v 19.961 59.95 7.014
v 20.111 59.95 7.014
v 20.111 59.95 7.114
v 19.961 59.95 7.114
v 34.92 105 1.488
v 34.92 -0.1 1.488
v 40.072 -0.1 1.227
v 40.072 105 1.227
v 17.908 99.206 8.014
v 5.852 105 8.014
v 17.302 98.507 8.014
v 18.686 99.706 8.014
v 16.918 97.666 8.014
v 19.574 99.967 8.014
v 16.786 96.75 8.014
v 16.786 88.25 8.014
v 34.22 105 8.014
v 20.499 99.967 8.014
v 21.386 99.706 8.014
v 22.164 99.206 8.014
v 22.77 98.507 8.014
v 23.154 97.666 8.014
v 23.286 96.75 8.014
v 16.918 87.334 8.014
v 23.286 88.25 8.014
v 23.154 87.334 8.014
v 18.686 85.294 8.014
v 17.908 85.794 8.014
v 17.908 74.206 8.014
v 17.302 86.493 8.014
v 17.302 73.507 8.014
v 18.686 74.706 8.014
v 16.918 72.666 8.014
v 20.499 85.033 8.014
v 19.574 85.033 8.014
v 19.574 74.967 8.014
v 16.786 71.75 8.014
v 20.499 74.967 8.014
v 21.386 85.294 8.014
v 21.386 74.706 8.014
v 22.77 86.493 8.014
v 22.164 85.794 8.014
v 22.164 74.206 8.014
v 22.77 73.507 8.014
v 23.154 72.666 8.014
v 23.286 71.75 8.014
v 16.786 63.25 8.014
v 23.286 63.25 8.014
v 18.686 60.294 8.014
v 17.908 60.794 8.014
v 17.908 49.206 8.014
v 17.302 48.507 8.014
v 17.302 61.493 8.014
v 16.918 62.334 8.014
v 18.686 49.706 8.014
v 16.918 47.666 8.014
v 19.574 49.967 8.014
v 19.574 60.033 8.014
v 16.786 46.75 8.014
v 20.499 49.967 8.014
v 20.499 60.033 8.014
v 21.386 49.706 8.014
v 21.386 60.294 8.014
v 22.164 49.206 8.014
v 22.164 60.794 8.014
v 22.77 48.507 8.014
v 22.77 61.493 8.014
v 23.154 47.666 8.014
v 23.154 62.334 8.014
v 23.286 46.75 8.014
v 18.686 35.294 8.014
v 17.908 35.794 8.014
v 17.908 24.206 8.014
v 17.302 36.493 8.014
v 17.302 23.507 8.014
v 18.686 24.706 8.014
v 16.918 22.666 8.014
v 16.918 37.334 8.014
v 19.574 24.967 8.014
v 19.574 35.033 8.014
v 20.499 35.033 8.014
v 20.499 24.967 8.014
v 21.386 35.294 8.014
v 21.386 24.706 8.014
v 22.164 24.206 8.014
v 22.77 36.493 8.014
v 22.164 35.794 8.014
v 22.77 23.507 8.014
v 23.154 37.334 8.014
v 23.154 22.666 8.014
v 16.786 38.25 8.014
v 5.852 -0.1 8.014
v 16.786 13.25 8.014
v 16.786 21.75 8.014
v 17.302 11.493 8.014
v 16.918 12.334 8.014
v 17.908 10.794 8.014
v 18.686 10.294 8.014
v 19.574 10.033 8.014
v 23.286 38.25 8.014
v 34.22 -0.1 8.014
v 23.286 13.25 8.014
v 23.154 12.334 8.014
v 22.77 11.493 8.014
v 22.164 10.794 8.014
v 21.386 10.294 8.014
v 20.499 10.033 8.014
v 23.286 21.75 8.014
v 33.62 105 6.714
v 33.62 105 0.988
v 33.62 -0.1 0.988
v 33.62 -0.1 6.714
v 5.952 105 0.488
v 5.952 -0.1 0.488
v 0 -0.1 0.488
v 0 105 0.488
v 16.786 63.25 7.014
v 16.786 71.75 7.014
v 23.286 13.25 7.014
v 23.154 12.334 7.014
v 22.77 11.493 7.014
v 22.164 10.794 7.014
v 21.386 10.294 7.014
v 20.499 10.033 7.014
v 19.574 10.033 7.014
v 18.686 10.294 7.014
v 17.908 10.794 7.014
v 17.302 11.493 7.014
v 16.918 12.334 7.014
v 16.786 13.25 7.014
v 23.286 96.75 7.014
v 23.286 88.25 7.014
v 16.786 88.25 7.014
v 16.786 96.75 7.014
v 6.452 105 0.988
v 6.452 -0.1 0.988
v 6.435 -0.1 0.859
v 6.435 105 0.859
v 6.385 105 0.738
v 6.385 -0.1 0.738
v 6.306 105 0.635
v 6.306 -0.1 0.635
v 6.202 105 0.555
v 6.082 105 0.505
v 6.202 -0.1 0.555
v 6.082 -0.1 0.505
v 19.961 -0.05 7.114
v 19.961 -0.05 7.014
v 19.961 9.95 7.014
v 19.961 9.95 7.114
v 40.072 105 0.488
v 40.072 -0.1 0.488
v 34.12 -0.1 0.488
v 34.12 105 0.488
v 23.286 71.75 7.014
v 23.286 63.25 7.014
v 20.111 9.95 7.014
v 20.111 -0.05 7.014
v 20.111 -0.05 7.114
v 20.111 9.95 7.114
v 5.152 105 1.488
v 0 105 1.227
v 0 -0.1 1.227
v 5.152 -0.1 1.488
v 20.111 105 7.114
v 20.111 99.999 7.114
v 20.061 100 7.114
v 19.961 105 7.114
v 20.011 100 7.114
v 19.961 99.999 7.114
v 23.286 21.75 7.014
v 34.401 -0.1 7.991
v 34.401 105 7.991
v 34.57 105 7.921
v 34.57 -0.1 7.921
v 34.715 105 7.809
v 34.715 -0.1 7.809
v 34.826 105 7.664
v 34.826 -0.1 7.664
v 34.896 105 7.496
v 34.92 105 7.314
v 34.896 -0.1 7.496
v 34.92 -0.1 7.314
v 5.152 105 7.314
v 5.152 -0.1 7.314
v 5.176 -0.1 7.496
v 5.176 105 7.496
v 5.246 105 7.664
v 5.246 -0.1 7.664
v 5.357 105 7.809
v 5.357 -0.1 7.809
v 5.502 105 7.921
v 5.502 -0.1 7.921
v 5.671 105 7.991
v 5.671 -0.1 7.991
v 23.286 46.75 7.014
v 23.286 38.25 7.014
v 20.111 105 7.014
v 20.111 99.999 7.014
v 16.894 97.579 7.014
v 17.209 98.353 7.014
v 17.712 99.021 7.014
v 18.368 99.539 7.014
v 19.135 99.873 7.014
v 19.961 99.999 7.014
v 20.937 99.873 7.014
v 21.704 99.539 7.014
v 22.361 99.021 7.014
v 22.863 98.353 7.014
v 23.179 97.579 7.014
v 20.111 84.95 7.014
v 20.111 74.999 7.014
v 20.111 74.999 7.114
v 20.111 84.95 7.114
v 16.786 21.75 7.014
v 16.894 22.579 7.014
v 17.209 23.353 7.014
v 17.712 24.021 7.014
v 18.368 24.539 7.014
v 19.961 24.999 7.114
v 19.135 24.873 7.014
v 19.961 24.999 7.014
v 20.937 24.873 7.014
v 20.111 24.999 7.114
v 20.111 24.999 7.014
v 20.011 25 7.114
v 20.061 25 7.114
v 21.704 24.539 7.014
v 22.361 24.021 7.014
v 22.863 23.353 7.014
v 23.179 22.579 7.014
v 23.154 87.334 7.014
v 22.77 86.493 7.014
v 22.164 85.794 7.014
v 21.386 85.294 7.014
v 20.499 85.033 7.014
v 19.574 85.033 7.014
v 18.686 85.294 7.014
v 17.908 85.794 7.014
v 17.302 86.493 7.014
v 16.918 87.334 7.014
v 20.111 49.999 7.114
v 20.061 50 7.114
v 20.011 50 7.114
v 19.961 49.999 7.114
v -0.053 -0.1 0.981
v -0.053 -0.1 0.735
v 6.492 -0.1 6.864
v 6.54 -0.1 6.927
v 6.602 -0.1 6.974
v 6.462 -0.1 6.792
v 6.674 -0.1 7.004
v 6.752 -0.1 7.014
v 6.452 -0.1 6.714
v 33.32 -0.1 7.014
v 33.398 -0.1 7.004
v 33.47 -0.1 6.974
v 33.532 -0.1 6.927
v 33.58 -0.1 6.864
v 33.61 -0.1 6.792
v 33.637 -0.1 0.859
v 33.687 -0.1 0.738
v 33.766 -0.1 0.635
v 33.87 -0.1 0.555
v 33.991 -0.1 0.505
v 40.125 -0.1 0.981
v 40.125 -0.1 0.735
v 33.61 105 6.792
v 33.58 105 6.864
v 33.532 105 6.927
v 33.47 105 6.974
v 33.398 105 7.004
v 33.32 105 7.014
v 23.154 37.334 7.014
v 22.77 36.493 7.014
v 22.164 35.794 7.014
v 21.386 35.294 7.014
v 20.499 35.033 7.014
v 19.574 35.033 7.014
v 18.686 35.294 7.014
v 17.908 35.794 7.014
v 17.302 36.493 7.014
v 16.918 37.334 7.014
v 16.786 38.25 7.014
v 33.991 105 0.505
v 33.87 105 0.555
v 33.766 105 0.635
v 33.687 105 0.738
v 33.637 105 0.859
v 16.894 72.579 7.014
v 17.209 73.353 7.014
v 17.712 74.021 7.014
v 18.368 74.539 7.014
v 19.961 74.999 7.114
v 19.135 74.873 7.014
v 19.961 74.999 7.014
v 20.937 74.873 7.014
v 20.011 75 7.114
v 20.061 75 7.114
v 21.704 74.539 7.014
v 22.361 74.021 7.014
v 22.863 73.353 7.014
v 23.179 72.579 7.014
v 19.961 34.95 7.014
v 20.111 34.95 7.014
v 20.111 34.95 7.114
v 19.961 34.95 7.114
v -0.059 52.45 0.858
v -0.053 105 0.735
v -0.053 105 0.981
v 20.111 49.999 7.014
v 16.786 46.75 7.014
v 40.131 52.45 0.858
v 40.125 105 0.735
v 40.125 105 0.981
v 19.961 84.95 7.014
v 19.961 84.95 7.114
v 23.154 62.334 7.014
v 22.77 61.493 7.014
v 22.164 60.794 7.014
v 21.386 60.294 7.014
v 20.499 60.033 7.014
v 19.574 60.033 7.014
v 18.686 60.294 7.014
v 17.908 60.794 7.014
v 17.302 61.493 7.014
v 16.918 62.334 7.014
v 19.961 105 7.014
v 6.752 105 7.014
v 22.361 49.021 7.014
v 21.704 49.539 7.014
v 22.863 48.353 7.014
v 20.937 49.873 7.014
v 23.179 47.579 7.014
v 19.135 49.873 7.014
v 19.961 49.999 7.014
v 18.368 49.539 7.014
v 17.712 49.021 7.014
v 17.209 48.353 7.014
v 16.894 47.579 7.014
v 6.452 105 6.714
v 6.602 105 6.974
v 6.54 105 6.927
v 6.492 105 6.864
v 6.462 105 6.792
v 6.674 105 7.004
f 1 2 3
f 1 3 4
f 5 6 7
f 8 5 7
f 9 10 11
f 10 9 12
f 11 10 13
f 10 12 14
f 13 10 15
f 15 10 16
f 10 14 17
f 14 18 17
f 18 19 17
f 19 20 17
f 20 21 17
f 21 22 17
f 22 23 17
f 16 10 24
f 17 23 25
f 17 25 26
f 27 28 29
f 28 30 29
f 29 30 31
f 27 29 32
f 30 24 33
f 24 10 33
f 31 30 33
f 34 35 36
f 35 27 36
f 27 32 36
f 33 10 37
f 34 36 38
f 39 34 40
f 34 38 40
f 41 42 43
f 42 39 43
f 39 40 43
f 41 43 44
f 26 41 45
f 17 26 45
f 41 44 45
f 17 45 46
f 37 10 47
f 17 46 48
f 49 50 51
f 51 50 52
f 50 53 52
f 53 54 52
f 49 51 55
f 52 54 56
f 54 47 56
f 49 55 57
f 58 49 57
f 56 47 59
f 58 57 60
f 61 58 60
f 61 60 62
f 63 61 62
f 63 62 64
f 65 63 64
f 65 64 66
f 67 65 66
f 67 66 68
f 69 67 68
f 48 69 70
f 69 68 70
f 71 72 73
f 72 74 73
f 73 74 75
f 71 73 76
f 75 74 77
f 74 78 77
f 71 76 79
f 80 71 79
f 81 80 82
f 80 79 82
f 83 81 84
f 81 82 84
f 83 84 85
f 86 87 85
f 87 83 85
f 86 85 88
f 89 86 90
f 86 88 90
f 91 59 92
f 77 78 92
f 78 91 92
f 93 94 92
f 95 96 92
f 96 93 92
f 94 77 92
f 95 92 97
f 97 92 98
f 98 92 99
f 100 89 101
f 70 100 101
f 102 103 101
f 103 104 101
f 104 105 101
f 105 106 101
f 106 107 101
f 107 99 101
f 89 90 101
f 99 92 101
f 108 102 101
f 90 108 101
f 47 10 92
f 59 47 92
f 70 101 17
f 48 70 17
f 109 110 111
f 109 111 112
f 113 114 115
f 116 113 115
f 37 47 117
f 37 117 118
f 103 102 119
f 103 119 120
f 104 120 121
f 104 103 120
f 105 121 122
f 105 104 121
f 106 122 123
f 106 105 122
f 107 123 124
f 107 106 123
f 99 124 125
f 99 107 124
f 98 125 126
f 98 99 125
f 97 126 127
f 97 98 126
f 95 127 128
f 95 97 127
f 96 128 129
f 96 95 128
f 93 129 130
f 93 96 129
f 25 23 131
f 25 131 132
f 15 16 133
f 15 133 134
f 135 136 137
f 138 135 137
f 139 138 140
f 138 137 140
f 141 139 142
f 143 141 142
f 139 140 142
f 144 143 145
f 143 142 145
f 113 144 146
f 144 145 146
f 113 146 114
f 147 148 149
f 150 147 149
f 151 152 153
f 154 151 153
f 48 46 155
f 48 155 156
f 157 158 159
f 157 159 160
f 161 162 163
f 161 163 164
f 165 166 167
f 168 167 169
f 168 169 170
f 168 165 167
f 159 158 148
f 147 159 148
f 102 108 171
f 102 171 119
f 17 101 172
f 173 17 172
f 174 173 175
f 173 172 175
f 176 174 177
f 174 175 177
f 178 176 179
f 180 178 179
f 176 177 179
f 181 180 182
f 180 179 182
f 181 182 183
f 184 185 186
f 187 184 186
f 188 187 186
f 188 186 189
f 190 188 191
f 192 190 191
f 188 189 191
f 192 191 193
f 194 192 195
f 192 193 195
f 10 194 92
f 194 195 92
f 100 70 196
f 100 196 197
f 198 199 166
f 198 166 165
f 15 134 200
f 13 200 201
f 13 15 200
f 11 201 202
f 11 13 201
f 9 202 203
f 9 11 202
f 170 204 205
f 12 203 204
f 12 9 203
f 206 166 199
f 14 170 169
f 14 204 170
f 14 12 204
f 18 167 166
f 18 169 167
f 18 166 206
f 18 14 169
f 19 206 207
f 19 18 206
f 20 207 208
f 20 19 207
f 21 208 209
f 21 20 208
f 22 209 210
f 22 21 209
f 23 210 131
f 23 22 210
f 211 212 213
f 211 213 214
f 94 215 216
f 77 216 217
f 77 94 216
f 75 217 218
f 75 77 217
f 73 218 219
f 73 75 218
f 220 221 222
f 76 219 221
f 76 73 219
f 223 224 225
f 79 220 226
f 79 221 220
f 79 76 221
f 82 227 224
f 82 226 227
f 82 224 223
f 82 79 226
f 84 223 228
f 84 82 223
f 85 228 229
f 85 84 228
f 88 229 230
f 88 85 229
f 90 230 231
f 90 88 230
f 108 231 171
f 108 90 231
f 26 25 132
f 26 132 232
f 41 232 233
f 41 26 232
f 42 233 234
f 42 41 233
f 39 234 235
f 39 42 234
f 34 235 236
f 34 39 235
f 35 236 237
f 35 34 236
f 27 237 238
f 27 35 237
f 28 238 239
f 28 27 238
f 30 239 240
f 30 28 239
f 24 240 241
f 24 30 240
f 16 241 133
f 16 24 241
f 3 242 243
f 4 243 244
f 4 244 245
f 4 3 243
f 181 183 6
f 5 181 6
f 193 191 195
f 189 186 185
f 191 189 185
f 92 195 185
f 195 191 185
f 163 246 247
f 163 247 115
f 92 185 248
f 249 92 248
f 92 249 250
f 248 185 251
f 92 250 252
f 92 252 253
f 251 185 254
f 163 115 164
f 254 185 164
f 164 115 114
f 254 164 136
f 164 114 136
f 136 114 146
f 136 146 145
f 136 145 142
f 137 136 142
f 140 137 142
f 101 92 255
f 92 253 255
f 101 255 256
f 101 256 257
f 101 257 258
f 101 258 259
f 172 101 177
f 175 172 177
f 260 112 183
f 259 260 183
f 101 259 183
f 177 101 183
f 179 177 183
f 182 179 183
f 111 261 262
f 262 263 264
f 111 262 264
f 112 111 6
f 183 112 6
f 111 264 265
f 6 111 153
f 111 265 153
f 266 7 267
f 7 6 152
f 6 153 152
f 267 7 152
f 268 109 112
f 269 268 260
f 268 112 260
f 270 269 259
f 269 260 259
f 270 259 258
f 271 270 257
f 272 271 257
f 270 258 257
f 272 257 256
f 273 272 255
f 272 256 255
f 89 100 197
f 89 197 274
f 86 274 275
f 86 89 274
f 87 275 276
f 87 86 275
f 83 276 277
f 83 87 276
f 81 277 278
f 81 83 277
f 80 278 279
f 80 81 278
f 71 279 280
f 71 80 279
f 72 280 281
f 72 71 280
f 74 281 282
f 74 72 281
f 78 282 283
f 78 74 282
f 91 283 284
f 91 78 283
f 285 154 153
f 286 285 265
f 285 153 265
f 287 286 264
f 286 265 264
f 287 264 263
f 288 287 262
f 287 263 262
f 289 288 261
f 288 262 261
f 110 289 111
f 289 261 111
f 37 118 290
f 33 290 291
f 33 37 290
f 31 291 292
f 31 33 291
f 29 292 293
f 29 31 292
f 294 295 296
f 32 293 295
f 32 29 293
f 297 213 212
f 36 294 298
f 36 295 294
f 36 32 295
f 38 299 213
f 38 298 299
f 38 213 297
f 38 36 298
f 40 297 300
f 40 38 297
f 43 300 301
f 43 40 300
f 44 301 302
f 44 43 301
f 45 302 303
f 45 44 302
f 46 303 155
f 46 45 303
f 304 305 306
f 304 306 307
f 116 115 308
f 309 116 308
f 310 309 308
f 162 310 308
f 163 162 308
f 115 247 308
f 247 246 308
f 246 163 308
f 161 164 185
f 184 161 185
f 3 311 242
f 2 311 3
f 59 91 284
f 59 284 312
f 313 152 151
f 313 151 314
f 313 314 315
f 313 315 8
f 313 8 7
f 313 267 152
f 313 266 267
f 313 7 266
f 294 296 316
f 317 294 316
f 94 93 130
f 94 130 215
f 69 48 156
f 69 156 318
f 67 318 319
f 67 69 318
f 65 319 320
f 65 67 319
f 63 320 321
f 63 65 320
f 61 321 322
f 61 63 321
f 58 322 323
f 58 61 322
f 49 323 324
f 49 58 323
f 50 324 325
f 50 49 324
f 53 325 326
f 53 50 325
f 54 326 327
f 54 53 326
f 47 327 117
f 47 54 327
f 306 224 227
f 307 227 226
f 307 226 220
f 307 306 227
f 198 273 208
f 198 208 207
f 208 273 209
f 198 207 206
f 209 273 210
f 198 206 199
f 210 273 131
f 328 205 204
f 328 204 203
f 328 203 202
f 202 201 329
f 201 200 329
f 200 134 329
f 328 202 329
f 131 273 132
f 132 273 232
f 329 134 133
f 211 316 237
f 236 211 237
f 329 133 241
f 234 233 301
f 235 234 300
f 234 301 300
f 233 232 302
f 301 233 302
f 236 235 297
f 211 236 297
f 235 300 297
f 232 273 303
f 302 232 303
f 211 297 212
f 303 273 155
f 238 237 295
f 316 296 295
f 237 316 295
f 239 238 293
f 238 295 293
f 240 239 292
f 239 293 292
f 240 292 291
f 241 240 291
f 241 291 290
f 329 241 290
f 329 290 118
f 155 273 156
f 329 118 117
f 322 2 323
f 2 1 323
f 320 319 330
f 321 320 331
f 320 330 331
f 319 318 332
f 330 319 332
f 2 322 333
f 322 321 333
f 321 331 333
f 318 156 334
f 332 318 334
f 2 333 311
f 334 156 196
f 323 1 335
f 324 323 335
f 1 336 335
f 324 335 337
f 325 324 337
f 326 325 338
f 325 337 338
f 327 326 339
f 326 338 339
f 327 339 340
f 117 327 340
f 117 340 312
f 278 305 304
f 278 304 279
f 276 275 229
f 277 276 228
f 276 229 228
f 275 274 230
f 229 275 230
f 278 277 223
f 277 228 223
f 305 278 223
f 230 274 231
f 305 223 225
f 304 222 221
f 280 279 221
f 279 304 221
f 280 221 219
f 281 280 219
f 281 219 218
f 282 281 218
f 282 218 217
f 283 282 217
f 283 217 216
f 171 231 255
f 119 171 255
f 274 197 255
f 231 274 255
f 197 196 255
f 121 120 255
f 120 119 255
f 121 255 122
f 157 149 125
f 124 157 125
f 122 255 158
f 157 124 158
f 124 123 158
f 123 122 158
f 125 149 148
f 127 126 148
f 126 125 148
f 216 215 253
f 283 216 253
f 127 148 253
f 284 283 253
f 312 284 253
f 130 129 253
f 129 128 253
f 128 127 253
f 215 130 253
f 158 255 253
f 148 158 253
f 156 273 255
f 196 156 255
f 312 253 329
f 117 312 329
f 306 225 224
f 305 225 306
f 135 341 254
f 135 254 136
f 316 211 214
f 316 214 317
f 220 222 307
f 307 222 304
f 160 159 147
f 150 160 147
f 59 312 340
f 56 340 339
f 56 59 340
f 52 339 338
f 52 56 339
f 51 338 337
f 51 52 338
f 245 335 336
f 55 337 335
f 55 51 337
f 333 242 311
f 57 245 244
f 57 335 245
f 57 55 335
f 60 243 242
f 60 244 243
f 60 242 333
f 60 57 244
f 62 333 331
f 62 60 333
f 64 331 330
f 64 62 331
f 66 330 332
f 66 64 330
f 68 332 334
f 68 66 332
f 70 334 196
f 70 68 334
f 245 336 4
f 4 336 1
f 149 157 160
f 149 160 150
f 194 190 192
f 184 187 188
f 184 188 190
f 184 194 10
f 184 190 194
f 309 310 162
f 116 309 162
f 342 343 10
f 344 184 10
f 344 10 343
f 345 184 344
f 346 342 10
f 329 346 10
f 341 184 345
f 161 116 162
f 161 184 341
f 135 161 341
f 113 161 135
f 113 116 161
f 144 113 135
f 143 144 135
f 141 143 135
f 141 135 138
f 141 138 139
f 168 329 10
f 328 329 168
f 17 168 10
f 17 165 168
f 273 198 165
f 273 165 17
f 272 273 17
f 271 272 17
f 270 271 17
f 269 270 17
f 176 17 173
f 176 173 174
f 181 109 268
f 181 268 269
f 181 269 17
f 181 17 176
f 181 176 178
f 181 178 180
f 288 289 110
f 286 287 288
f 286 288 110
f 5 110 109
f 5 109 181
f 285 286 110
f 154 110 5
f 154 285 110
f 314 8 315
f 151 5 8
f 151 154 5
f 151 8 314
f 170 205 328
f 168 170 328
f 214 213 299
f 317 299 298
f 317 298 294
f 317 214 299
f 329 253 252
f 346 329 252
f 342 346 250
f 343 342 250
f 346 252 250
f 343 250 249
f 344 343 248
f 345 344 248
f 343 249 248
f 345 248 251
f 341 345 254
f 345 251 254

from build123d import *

# Parameters (mm, degrees)
SALIENTE_EXTRUIR1_DEPTH      = 105
SALIENTE_EXTRUIR1_DEPTH_BACK = 0.1
CORTAR_EXTRUIR4_DEPTH        = 10
CROQUIS4_W                   = 0.15
CROQUIS4_H                   = 10
CORTAR_EXTRUIR9_DEPTH        = 0.1


with BuildPart() as part:
    # Croquis1 → Saliente-Extruir1 (new, two sides: drawn at the far end of the back side and taken through both)
    with BuildSketch(Plane(origin=(0, 0, 0), x_dir=(1, 0, 0), z_dir=(0, 1, 0)).offset(-SALIENTE_EXTRUIR1_DEPTH_BACK)):
        with BuildLine():
            Line((34.919955981, -1.488391566), (40.072080634, -1.226803632))
            add(Edge.make_bspline(
                [(40.072080634, -0.488391566), (40.190854748, -0.858541724), (40.072080634, -1.226803632)],
                knots=[0, 0, 0, 1, 1, 1], degree=2))
            Line((40.072080634, -0.488391566), (34.119955981, -0.488391566))
            ThreePointArc((34.119955981, -0.488391566), (33.766402591, -0.634838176), (33.619955981, -0.988391566))
            Line((33.619955981, -0.988391566), (33.619955981, -6.714416127))
            ThreePointArc((33.619955981, -6.714416127), (33.532088016, -6.926548161), (33.319955981, -7.014416127))
            Line((33.319955981, -7.014416127), (6.752124653, -7.014416127))
            ThreePointArc((6.752124653, -7.014416127), (6.539992619, -6.926548161), (6.452124653, -6.714416127))
            Line((6.452124653, -6.714416127), (6.452124653, -0.988391566))
            ThreePointArc((6.452124653, -0.988391566), (6.305678044, -0.634838176), (5.952124653, -0.488391566))
            Line((5.952124653, -0.488391566), (0, -0.488391566))
            add(Edge.make_bspline(
                [(0, -0.488391566), (-0.118774114, -0.858541724), (0, -1.226803632)],
                knots=[0, 0, 0, 1, 1, 1], degree=2))
            Line((0, -1.226803632), (5.152124653, -1.488391566))
            Line((5.152124653, -1.488391566), (5.152124653, -7.314416127))
            ThreePointArc((5.152124653, -7.314416127), (5.357149906, -7.809390874), (5.852124653, -8.014416127))
            Line((5.852124653, -8.014416127), (34.219955981, -8.014416127))
            ThreePointArc((34.219955981, -8.014416127), (34.714930728, -7.809390874), (34.919955981, -7.314416127))
            Line((34.919955981, -7.314416127), (34.919955981, -1.488391566))
        make_face()
    extrude(amount=SALIENTE_EXTRUIR1_DEPTH + SALIENTE_EXTRUIR1_DEPTH_BACK)

    # Croquis2 → Cortar-Extruir4 (cut)
    with BuildSketch(Plane.XY.offset(8.014416127)):
        with BuildLine():
            Line((16.786040317, 38.25), (16.786040317, 46.75))
            ThreePointArc((16.786040317, 46.75), (20.036040317, 50), (23.286040317, 46.75))
            Line((23.286040317, 46.75), (23.286040317, 38.25))
            ThreePointArc((23.286040317, 38.25), (20.036040317, 35), (16.786040317, 38.25))
        make_face()
        with BuildLine():
            Line((16.786040317, 13.25), (16.786040317, 21.75))
            ThreePointArc((16.786040317, 21.75), (20.036040317, 25), (23.286040317, 21.75))
            Line((23.286040317, 21.75), (23.286040317, 13.25))
            ThreePointArc((23.286040317, 13.25), (20.036040317, 10), (16.786040317, 13.25))
        make_face()
        with BuildLine():
            Line((16.786040317, 63.25), (16.786040317, 71.75))
            ThreePointArc((16.786040317, 71.75), (20.036040317, 75), (23.286040317, 71.75))
            Line((23.286040317, 71.75), (23.286040317, 63.25))
            ThreePointArc((23.286040317, 63.25), (20.036040317, 60), (16.786040317, 63.25))
        make_face()
        with BuildLine():
            Line((16.786040317, 88.25), (16.786040317, 96.75))
            ThreePointArc((16.786040317, 96.75), (20.036040317, 100), (23.286040317, 96.75))
            Line((23.286040317, 96.75), (23.286040317, 88.25))
            ThreePointArc((23.286040317, 88.25), (20.036040317, 85), (16.786040317, 88.25))
        make_face()
        with BuildLine():
            Line((16.786040317, 113.25), (16.786040317, 121.75))
            ThreePointArc((16.786040317, 121.75), (20.036040317, 125), (23.286040317, 121.75))
            Line((23.286040317, 121.75), (23.286040317, 113.25))
            ThreePointArc((23.286040317, 113.25), (20.036040317, 110), (16.786040317, 113.25))
        make_face()
        with BuildLine():
            Line((16.786040317, 138.25), (16.786040317, 146.75))
            ThreePointArc((16.786040317, 146.75), (20.036040317, 150), (23.286040317, 146.75))
            Line((23.286040317, 146.75), (23.286040317, 138.25))
            ThreePointArc((23.286040317, 138.25), (20.036040317, 135), (16.786040317, 138.25))
        make_face()
        with BuildLine():
            Line((16.786040317, 163.25), (16.786040317, 171.75))
            ThreePointArc((16.786040317, 171.75), (20.036040317, 175), (23.286040317, 171.75))
            Line((23.286040317, 171.75), (23.286040317, 163.25))
            ThreePointArc((23.286040317, 163.25), (20.036040317, 160), (16.786040317, 163.25))
        make_face()
        with BuildLine():
            Line((16.786040317, 188.25), (16.786040317, 196.75))
            ThreePointArc((16.786040317, 196.75), (20.036040317, 200), (23.286040317, 196.75))
            Line((23.286040317, 196.75), (23.286040317, 188.25))
            ThreePointArc((23.286040317, 188.25), (20.036040317, 185), (16.786040317, 188.25))
        make_face()
    extrude(amount=-CORTAR_EXTRUIR4_DEPTH, mode=Mode.SUBTRACT)

    # Croquis4 → Cortar-Extruir9 (cut)
    with BuildSketch(Plane(origin=(0, 0, 7.014416127), x_dir=(-1, 0, 0), z_dir=(0, 0, -1))):
        with Locations((-20.036040317, 29.95)):
            Rectangle(CROQUIS4_W, CROQUIS4_H)
        with Locations((-20.036040317, 4.95)):
            Rectangle(CROQUIS4_W, CROQUIS4_H)
        with Locations((-20.036040317, 54.95)):
            Rectangle(CROQUIS4_W, CROQUIS4_H)
        with Locations((-20.036040317, 79.95)):
            Rectangle(CROQUIS4_W, CROQUIS4_H)
        with Locations((-20.036040317, 104.95)):
            Rectangle(CROQUIS4_W, CROQUIS4_H)
        with Locations((-20.036040317, 129.95)):
            Rectangle(CROQUIS4_W, CROQUIS4_H)
        with Locations((-20.036040317, 154.95)):
            Rectangle(CROQUIS4_W, CROQUIS4_H)
        with Locations((-20.036040317, 179.95)):
            Rectangle(CROQUIS4_W, CROQUIS4_H)
    extrude(amount=-CORTAR_EXTRUIR9_DEPTH, mode=Mode.SUBTRACT)


solid = part.part
